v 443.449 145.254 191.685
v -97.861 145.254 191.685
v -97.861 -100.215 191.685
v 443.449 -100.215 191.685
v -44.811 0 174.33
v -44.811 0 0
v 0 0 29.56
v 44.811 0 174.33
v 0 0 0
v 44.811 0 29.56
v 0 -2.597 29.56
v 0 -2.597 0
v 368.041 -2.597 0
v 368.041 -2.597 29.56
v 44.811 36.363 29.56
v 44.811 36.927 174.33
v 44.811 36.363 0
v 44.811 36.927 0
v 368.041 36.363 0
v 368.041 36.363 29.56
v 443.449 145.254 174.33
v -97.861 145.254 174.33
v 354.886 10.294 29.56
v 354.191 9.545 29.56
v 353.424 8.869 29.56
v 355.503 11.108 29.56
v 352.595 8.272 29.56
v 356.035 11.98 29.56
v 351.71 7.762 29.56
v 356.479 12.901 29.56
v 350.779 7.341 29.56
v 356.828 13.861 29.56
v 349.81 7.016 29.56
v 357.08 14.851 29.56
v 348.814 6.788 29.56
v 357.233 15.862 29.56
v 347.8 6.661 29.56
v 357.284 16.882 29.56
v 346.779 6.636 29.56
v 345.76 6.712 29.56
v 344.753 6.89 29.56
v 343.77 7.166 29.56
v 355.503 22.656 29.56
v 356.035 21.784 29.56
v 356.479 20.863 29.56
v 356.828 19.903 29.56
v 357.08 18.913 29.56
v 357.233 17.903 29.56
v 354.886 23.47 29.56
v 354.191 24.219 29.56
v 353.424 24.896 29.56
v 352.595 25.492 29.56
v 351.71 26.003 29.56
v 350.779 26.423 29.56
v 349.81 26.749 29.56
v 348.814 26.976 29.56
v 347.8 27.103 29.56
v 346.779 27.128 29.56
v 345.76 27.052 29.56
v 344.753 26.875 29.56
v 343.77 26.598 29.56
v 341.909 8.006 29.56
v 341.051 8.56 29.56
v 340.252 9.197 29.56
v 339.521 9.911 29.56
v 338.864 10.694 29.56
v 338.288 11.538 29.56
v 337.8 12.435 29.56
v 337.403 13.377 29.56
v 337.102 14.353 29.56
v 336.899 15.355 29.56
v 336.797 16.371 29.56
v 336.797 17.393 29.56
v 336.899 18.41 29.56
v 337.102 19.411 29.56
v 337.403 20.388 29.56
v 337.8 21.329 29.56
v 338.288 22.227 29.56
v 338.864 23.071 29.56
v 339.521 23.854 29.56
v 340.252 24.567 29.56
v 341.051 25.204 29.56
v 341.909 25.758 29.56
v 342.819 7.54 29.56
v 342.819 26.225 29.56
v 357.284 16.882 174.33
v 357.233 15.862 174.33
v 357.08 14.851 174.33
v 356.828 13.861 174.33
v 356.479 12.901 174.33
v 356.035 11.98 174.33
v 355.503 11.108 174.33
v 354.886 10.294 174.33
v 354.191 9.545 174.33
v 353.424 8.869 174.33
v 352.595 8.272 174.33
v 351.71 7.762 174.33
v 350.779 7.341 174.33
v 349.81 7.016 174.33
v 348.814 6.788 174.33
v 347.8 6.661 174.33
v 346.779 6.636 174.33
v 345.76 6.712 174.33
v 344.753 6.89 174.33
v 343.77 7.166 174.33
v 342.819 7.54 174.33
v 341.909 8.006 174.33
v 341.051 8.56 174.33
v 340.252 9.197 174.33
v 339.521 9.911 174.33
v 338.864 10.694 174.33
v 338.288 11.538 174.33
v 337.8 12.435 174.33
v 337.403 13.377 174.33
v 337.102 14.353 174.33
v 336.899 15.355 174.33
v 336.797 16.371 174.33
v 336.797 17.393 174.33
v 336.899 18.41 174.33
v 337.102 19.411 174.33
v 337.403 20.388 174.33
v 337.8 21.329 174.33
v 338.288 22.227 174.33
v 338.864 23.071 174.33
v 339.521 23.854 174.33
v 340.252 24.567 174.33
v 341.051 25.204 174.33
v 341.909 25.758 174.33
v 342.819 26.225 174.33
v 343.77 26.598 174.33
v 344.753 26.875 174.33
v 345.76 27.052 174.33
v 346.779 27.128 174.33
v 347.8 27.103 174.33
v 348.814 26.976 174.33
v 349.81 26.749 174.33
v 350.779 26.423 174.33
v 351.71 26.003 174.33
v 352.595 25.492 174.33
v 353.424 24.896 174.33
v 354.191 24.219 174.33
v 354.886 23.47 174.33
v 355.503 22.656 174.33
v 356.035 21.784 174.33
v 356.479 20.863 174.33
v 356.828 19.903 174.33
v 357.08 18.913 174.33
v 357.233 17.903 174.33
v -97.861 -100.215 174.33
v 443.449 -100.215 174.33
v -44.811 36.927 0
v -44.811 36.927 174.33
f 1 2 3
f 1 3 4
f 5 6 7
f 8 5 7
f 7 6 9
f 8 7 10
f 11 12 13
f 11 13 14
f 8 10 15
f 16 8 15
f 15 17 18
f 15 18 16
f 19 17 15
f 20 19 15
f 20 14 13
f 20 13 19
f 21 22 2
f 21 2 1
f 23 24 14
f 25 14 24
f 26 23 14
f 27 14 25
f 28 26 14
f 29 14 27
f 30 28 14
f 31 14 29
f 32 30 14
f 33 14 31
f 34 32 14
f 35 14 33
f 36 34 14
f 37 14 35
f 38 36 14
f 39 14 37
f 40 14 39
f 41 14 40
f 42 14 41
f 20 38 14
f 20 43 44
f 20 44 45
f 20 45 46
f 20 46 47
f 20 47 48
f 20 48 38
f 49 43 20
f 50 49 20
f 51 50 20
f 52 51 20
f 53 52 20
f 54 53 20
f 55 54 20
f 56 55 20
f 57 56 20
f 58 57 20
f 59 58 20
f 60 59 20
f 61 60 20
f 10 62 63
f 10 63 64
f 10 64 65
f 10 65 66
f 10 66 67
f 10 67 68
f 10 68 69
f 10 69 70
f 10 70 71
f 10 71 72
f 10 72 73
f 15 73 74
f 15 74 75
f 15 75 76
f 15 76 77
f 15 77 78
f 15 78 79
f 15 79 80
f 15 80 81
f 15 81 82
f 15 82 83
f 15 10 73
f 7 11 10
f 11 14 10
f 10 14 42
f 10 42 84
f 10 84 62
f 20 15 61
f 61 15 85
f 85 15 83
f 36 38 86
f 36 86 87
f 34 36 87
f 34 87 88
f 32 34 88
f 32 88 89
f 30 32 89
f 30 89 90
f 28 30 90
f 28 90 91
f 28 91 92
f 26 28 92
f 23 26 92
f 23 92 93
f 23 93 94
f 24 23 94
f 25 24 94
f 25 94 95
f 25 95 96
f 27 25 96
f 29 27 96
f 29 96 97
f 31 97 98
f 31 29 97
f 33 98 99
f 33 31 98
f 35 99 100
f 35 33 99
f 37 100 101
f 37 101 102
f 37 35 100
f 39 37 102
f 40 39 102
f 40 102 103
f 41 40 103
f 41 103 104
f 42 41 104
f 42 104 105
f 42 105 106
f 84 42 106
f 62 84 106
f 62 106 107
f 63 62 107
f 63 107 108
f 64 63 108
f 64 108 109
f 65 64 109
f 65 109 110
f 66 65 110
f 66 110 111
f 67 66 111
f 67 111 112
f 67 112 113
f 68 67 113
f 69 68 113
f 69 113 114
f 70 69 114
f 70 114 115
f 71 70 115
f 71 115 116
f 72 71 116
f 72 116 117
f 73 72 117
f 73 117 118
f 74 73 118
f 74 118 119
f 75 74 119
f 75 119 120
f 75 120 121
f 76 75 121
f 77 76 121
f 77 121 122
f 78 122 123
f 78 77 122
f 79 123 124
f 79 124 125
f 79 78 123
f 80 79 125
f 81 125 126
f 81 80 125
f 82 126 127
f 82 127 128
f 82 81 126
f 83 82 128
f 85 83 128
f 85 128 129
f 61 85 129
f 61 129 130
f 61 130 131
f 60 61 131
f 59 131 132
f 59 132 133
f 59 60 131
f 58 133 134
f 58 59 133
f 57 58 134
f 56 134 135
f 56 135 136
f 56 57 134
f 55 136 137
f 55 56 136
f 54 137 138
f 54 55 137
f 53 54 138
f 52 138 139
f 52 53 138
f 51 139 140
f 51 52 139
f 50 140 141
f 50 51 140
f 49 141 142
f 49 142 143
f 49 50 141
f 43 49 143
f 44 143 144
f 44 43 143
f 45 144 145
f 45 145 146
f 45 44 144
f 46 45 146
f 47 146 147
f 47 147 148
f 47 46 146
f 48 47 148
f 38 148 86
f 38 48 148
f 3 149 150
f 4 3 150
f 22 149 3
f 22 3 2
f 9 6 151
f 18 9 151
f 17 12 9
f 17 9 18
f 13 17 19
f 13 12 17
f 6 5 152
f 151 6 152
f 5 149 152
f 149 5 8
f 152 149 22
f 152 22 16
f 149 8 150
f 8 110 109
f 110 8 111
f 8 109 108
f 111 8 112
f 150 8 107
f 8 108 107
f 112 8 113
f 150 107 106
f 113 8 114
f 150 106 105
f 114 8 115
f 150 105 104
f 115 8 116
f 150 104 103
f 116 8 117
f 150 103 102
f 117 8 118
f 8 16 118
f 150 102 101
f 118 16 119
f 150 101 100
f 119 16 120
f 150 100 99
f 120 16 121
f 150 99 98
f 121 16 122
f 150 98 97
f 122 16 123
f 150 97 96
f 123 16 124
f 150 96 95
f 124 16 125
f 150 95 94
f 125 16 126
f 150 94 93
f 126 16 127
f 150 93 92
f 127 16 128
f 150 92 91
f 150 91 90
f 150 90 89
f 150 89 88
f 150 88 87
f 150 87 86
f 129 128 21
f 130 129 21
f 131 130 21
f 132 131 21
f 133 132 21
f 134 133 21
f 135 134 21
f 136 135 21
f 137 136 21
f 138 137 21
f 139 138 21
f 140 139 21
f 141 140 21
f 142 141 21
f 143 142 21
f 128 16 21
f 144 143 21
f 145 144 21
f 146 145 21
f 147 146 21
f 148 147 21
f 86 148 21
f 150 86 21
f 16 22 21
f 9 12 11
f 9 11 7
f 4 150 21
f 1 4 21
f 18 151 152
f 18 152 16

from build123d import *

# Parameters (mm, degrees)
F0_W     = 89.621424675
F0_H     = 36.9273871183
F1_DEPTH = 174.3299812078
F3_W     = 541.3100868464
F3_H     = 245.468556881
F4_DEPTH = 17.3550322652
F2_W     = 38.959980011
F2_H     = 29.5604169369
F5_DEPTH = 368.040561676
F6_R     = 10.2494359016
F7_DEPTH = 180.2812367678


with BuildPart() as f1:
    # F0 (on Top) → F1 (new body)
    with BuildSketch(Plane.XY):
        with Locations((0, 18.4636935592)):
            Rectangle(F0_W, F0_H)
    extrude(amount=F1_DEPTH)

    # F3 (on face) → F4 (join)
    with BuildSketch(Plane.XY.offset(174.3299812078)):
        with Locations((172.7937683463, 22.5193798542)):
            Rectangle(F3_W, F3_H)
    extrude(amount=F4_DEPTH)

    # F2 (on Right) → F5 (join)
    with BuildSketch(Plane.YZ):
        with Locations((16.8825984001, 14.7802084684)):
            Rectangle(F2_W, F2_H)
    extrude(amount=F5_DEPTH)

    # F6 (on face) → F7 (join)
    with BuildSketch(Plane(origin=(0, 0, 0), x_dir=(1, 0, 0), z_dir=(0, 0, -1))):
        with Locations((347.0340669155, -16.8822109699)):
            Circle(F6_R)
    extrude(amount=-F7_DEPTH)


solid = f1.part
